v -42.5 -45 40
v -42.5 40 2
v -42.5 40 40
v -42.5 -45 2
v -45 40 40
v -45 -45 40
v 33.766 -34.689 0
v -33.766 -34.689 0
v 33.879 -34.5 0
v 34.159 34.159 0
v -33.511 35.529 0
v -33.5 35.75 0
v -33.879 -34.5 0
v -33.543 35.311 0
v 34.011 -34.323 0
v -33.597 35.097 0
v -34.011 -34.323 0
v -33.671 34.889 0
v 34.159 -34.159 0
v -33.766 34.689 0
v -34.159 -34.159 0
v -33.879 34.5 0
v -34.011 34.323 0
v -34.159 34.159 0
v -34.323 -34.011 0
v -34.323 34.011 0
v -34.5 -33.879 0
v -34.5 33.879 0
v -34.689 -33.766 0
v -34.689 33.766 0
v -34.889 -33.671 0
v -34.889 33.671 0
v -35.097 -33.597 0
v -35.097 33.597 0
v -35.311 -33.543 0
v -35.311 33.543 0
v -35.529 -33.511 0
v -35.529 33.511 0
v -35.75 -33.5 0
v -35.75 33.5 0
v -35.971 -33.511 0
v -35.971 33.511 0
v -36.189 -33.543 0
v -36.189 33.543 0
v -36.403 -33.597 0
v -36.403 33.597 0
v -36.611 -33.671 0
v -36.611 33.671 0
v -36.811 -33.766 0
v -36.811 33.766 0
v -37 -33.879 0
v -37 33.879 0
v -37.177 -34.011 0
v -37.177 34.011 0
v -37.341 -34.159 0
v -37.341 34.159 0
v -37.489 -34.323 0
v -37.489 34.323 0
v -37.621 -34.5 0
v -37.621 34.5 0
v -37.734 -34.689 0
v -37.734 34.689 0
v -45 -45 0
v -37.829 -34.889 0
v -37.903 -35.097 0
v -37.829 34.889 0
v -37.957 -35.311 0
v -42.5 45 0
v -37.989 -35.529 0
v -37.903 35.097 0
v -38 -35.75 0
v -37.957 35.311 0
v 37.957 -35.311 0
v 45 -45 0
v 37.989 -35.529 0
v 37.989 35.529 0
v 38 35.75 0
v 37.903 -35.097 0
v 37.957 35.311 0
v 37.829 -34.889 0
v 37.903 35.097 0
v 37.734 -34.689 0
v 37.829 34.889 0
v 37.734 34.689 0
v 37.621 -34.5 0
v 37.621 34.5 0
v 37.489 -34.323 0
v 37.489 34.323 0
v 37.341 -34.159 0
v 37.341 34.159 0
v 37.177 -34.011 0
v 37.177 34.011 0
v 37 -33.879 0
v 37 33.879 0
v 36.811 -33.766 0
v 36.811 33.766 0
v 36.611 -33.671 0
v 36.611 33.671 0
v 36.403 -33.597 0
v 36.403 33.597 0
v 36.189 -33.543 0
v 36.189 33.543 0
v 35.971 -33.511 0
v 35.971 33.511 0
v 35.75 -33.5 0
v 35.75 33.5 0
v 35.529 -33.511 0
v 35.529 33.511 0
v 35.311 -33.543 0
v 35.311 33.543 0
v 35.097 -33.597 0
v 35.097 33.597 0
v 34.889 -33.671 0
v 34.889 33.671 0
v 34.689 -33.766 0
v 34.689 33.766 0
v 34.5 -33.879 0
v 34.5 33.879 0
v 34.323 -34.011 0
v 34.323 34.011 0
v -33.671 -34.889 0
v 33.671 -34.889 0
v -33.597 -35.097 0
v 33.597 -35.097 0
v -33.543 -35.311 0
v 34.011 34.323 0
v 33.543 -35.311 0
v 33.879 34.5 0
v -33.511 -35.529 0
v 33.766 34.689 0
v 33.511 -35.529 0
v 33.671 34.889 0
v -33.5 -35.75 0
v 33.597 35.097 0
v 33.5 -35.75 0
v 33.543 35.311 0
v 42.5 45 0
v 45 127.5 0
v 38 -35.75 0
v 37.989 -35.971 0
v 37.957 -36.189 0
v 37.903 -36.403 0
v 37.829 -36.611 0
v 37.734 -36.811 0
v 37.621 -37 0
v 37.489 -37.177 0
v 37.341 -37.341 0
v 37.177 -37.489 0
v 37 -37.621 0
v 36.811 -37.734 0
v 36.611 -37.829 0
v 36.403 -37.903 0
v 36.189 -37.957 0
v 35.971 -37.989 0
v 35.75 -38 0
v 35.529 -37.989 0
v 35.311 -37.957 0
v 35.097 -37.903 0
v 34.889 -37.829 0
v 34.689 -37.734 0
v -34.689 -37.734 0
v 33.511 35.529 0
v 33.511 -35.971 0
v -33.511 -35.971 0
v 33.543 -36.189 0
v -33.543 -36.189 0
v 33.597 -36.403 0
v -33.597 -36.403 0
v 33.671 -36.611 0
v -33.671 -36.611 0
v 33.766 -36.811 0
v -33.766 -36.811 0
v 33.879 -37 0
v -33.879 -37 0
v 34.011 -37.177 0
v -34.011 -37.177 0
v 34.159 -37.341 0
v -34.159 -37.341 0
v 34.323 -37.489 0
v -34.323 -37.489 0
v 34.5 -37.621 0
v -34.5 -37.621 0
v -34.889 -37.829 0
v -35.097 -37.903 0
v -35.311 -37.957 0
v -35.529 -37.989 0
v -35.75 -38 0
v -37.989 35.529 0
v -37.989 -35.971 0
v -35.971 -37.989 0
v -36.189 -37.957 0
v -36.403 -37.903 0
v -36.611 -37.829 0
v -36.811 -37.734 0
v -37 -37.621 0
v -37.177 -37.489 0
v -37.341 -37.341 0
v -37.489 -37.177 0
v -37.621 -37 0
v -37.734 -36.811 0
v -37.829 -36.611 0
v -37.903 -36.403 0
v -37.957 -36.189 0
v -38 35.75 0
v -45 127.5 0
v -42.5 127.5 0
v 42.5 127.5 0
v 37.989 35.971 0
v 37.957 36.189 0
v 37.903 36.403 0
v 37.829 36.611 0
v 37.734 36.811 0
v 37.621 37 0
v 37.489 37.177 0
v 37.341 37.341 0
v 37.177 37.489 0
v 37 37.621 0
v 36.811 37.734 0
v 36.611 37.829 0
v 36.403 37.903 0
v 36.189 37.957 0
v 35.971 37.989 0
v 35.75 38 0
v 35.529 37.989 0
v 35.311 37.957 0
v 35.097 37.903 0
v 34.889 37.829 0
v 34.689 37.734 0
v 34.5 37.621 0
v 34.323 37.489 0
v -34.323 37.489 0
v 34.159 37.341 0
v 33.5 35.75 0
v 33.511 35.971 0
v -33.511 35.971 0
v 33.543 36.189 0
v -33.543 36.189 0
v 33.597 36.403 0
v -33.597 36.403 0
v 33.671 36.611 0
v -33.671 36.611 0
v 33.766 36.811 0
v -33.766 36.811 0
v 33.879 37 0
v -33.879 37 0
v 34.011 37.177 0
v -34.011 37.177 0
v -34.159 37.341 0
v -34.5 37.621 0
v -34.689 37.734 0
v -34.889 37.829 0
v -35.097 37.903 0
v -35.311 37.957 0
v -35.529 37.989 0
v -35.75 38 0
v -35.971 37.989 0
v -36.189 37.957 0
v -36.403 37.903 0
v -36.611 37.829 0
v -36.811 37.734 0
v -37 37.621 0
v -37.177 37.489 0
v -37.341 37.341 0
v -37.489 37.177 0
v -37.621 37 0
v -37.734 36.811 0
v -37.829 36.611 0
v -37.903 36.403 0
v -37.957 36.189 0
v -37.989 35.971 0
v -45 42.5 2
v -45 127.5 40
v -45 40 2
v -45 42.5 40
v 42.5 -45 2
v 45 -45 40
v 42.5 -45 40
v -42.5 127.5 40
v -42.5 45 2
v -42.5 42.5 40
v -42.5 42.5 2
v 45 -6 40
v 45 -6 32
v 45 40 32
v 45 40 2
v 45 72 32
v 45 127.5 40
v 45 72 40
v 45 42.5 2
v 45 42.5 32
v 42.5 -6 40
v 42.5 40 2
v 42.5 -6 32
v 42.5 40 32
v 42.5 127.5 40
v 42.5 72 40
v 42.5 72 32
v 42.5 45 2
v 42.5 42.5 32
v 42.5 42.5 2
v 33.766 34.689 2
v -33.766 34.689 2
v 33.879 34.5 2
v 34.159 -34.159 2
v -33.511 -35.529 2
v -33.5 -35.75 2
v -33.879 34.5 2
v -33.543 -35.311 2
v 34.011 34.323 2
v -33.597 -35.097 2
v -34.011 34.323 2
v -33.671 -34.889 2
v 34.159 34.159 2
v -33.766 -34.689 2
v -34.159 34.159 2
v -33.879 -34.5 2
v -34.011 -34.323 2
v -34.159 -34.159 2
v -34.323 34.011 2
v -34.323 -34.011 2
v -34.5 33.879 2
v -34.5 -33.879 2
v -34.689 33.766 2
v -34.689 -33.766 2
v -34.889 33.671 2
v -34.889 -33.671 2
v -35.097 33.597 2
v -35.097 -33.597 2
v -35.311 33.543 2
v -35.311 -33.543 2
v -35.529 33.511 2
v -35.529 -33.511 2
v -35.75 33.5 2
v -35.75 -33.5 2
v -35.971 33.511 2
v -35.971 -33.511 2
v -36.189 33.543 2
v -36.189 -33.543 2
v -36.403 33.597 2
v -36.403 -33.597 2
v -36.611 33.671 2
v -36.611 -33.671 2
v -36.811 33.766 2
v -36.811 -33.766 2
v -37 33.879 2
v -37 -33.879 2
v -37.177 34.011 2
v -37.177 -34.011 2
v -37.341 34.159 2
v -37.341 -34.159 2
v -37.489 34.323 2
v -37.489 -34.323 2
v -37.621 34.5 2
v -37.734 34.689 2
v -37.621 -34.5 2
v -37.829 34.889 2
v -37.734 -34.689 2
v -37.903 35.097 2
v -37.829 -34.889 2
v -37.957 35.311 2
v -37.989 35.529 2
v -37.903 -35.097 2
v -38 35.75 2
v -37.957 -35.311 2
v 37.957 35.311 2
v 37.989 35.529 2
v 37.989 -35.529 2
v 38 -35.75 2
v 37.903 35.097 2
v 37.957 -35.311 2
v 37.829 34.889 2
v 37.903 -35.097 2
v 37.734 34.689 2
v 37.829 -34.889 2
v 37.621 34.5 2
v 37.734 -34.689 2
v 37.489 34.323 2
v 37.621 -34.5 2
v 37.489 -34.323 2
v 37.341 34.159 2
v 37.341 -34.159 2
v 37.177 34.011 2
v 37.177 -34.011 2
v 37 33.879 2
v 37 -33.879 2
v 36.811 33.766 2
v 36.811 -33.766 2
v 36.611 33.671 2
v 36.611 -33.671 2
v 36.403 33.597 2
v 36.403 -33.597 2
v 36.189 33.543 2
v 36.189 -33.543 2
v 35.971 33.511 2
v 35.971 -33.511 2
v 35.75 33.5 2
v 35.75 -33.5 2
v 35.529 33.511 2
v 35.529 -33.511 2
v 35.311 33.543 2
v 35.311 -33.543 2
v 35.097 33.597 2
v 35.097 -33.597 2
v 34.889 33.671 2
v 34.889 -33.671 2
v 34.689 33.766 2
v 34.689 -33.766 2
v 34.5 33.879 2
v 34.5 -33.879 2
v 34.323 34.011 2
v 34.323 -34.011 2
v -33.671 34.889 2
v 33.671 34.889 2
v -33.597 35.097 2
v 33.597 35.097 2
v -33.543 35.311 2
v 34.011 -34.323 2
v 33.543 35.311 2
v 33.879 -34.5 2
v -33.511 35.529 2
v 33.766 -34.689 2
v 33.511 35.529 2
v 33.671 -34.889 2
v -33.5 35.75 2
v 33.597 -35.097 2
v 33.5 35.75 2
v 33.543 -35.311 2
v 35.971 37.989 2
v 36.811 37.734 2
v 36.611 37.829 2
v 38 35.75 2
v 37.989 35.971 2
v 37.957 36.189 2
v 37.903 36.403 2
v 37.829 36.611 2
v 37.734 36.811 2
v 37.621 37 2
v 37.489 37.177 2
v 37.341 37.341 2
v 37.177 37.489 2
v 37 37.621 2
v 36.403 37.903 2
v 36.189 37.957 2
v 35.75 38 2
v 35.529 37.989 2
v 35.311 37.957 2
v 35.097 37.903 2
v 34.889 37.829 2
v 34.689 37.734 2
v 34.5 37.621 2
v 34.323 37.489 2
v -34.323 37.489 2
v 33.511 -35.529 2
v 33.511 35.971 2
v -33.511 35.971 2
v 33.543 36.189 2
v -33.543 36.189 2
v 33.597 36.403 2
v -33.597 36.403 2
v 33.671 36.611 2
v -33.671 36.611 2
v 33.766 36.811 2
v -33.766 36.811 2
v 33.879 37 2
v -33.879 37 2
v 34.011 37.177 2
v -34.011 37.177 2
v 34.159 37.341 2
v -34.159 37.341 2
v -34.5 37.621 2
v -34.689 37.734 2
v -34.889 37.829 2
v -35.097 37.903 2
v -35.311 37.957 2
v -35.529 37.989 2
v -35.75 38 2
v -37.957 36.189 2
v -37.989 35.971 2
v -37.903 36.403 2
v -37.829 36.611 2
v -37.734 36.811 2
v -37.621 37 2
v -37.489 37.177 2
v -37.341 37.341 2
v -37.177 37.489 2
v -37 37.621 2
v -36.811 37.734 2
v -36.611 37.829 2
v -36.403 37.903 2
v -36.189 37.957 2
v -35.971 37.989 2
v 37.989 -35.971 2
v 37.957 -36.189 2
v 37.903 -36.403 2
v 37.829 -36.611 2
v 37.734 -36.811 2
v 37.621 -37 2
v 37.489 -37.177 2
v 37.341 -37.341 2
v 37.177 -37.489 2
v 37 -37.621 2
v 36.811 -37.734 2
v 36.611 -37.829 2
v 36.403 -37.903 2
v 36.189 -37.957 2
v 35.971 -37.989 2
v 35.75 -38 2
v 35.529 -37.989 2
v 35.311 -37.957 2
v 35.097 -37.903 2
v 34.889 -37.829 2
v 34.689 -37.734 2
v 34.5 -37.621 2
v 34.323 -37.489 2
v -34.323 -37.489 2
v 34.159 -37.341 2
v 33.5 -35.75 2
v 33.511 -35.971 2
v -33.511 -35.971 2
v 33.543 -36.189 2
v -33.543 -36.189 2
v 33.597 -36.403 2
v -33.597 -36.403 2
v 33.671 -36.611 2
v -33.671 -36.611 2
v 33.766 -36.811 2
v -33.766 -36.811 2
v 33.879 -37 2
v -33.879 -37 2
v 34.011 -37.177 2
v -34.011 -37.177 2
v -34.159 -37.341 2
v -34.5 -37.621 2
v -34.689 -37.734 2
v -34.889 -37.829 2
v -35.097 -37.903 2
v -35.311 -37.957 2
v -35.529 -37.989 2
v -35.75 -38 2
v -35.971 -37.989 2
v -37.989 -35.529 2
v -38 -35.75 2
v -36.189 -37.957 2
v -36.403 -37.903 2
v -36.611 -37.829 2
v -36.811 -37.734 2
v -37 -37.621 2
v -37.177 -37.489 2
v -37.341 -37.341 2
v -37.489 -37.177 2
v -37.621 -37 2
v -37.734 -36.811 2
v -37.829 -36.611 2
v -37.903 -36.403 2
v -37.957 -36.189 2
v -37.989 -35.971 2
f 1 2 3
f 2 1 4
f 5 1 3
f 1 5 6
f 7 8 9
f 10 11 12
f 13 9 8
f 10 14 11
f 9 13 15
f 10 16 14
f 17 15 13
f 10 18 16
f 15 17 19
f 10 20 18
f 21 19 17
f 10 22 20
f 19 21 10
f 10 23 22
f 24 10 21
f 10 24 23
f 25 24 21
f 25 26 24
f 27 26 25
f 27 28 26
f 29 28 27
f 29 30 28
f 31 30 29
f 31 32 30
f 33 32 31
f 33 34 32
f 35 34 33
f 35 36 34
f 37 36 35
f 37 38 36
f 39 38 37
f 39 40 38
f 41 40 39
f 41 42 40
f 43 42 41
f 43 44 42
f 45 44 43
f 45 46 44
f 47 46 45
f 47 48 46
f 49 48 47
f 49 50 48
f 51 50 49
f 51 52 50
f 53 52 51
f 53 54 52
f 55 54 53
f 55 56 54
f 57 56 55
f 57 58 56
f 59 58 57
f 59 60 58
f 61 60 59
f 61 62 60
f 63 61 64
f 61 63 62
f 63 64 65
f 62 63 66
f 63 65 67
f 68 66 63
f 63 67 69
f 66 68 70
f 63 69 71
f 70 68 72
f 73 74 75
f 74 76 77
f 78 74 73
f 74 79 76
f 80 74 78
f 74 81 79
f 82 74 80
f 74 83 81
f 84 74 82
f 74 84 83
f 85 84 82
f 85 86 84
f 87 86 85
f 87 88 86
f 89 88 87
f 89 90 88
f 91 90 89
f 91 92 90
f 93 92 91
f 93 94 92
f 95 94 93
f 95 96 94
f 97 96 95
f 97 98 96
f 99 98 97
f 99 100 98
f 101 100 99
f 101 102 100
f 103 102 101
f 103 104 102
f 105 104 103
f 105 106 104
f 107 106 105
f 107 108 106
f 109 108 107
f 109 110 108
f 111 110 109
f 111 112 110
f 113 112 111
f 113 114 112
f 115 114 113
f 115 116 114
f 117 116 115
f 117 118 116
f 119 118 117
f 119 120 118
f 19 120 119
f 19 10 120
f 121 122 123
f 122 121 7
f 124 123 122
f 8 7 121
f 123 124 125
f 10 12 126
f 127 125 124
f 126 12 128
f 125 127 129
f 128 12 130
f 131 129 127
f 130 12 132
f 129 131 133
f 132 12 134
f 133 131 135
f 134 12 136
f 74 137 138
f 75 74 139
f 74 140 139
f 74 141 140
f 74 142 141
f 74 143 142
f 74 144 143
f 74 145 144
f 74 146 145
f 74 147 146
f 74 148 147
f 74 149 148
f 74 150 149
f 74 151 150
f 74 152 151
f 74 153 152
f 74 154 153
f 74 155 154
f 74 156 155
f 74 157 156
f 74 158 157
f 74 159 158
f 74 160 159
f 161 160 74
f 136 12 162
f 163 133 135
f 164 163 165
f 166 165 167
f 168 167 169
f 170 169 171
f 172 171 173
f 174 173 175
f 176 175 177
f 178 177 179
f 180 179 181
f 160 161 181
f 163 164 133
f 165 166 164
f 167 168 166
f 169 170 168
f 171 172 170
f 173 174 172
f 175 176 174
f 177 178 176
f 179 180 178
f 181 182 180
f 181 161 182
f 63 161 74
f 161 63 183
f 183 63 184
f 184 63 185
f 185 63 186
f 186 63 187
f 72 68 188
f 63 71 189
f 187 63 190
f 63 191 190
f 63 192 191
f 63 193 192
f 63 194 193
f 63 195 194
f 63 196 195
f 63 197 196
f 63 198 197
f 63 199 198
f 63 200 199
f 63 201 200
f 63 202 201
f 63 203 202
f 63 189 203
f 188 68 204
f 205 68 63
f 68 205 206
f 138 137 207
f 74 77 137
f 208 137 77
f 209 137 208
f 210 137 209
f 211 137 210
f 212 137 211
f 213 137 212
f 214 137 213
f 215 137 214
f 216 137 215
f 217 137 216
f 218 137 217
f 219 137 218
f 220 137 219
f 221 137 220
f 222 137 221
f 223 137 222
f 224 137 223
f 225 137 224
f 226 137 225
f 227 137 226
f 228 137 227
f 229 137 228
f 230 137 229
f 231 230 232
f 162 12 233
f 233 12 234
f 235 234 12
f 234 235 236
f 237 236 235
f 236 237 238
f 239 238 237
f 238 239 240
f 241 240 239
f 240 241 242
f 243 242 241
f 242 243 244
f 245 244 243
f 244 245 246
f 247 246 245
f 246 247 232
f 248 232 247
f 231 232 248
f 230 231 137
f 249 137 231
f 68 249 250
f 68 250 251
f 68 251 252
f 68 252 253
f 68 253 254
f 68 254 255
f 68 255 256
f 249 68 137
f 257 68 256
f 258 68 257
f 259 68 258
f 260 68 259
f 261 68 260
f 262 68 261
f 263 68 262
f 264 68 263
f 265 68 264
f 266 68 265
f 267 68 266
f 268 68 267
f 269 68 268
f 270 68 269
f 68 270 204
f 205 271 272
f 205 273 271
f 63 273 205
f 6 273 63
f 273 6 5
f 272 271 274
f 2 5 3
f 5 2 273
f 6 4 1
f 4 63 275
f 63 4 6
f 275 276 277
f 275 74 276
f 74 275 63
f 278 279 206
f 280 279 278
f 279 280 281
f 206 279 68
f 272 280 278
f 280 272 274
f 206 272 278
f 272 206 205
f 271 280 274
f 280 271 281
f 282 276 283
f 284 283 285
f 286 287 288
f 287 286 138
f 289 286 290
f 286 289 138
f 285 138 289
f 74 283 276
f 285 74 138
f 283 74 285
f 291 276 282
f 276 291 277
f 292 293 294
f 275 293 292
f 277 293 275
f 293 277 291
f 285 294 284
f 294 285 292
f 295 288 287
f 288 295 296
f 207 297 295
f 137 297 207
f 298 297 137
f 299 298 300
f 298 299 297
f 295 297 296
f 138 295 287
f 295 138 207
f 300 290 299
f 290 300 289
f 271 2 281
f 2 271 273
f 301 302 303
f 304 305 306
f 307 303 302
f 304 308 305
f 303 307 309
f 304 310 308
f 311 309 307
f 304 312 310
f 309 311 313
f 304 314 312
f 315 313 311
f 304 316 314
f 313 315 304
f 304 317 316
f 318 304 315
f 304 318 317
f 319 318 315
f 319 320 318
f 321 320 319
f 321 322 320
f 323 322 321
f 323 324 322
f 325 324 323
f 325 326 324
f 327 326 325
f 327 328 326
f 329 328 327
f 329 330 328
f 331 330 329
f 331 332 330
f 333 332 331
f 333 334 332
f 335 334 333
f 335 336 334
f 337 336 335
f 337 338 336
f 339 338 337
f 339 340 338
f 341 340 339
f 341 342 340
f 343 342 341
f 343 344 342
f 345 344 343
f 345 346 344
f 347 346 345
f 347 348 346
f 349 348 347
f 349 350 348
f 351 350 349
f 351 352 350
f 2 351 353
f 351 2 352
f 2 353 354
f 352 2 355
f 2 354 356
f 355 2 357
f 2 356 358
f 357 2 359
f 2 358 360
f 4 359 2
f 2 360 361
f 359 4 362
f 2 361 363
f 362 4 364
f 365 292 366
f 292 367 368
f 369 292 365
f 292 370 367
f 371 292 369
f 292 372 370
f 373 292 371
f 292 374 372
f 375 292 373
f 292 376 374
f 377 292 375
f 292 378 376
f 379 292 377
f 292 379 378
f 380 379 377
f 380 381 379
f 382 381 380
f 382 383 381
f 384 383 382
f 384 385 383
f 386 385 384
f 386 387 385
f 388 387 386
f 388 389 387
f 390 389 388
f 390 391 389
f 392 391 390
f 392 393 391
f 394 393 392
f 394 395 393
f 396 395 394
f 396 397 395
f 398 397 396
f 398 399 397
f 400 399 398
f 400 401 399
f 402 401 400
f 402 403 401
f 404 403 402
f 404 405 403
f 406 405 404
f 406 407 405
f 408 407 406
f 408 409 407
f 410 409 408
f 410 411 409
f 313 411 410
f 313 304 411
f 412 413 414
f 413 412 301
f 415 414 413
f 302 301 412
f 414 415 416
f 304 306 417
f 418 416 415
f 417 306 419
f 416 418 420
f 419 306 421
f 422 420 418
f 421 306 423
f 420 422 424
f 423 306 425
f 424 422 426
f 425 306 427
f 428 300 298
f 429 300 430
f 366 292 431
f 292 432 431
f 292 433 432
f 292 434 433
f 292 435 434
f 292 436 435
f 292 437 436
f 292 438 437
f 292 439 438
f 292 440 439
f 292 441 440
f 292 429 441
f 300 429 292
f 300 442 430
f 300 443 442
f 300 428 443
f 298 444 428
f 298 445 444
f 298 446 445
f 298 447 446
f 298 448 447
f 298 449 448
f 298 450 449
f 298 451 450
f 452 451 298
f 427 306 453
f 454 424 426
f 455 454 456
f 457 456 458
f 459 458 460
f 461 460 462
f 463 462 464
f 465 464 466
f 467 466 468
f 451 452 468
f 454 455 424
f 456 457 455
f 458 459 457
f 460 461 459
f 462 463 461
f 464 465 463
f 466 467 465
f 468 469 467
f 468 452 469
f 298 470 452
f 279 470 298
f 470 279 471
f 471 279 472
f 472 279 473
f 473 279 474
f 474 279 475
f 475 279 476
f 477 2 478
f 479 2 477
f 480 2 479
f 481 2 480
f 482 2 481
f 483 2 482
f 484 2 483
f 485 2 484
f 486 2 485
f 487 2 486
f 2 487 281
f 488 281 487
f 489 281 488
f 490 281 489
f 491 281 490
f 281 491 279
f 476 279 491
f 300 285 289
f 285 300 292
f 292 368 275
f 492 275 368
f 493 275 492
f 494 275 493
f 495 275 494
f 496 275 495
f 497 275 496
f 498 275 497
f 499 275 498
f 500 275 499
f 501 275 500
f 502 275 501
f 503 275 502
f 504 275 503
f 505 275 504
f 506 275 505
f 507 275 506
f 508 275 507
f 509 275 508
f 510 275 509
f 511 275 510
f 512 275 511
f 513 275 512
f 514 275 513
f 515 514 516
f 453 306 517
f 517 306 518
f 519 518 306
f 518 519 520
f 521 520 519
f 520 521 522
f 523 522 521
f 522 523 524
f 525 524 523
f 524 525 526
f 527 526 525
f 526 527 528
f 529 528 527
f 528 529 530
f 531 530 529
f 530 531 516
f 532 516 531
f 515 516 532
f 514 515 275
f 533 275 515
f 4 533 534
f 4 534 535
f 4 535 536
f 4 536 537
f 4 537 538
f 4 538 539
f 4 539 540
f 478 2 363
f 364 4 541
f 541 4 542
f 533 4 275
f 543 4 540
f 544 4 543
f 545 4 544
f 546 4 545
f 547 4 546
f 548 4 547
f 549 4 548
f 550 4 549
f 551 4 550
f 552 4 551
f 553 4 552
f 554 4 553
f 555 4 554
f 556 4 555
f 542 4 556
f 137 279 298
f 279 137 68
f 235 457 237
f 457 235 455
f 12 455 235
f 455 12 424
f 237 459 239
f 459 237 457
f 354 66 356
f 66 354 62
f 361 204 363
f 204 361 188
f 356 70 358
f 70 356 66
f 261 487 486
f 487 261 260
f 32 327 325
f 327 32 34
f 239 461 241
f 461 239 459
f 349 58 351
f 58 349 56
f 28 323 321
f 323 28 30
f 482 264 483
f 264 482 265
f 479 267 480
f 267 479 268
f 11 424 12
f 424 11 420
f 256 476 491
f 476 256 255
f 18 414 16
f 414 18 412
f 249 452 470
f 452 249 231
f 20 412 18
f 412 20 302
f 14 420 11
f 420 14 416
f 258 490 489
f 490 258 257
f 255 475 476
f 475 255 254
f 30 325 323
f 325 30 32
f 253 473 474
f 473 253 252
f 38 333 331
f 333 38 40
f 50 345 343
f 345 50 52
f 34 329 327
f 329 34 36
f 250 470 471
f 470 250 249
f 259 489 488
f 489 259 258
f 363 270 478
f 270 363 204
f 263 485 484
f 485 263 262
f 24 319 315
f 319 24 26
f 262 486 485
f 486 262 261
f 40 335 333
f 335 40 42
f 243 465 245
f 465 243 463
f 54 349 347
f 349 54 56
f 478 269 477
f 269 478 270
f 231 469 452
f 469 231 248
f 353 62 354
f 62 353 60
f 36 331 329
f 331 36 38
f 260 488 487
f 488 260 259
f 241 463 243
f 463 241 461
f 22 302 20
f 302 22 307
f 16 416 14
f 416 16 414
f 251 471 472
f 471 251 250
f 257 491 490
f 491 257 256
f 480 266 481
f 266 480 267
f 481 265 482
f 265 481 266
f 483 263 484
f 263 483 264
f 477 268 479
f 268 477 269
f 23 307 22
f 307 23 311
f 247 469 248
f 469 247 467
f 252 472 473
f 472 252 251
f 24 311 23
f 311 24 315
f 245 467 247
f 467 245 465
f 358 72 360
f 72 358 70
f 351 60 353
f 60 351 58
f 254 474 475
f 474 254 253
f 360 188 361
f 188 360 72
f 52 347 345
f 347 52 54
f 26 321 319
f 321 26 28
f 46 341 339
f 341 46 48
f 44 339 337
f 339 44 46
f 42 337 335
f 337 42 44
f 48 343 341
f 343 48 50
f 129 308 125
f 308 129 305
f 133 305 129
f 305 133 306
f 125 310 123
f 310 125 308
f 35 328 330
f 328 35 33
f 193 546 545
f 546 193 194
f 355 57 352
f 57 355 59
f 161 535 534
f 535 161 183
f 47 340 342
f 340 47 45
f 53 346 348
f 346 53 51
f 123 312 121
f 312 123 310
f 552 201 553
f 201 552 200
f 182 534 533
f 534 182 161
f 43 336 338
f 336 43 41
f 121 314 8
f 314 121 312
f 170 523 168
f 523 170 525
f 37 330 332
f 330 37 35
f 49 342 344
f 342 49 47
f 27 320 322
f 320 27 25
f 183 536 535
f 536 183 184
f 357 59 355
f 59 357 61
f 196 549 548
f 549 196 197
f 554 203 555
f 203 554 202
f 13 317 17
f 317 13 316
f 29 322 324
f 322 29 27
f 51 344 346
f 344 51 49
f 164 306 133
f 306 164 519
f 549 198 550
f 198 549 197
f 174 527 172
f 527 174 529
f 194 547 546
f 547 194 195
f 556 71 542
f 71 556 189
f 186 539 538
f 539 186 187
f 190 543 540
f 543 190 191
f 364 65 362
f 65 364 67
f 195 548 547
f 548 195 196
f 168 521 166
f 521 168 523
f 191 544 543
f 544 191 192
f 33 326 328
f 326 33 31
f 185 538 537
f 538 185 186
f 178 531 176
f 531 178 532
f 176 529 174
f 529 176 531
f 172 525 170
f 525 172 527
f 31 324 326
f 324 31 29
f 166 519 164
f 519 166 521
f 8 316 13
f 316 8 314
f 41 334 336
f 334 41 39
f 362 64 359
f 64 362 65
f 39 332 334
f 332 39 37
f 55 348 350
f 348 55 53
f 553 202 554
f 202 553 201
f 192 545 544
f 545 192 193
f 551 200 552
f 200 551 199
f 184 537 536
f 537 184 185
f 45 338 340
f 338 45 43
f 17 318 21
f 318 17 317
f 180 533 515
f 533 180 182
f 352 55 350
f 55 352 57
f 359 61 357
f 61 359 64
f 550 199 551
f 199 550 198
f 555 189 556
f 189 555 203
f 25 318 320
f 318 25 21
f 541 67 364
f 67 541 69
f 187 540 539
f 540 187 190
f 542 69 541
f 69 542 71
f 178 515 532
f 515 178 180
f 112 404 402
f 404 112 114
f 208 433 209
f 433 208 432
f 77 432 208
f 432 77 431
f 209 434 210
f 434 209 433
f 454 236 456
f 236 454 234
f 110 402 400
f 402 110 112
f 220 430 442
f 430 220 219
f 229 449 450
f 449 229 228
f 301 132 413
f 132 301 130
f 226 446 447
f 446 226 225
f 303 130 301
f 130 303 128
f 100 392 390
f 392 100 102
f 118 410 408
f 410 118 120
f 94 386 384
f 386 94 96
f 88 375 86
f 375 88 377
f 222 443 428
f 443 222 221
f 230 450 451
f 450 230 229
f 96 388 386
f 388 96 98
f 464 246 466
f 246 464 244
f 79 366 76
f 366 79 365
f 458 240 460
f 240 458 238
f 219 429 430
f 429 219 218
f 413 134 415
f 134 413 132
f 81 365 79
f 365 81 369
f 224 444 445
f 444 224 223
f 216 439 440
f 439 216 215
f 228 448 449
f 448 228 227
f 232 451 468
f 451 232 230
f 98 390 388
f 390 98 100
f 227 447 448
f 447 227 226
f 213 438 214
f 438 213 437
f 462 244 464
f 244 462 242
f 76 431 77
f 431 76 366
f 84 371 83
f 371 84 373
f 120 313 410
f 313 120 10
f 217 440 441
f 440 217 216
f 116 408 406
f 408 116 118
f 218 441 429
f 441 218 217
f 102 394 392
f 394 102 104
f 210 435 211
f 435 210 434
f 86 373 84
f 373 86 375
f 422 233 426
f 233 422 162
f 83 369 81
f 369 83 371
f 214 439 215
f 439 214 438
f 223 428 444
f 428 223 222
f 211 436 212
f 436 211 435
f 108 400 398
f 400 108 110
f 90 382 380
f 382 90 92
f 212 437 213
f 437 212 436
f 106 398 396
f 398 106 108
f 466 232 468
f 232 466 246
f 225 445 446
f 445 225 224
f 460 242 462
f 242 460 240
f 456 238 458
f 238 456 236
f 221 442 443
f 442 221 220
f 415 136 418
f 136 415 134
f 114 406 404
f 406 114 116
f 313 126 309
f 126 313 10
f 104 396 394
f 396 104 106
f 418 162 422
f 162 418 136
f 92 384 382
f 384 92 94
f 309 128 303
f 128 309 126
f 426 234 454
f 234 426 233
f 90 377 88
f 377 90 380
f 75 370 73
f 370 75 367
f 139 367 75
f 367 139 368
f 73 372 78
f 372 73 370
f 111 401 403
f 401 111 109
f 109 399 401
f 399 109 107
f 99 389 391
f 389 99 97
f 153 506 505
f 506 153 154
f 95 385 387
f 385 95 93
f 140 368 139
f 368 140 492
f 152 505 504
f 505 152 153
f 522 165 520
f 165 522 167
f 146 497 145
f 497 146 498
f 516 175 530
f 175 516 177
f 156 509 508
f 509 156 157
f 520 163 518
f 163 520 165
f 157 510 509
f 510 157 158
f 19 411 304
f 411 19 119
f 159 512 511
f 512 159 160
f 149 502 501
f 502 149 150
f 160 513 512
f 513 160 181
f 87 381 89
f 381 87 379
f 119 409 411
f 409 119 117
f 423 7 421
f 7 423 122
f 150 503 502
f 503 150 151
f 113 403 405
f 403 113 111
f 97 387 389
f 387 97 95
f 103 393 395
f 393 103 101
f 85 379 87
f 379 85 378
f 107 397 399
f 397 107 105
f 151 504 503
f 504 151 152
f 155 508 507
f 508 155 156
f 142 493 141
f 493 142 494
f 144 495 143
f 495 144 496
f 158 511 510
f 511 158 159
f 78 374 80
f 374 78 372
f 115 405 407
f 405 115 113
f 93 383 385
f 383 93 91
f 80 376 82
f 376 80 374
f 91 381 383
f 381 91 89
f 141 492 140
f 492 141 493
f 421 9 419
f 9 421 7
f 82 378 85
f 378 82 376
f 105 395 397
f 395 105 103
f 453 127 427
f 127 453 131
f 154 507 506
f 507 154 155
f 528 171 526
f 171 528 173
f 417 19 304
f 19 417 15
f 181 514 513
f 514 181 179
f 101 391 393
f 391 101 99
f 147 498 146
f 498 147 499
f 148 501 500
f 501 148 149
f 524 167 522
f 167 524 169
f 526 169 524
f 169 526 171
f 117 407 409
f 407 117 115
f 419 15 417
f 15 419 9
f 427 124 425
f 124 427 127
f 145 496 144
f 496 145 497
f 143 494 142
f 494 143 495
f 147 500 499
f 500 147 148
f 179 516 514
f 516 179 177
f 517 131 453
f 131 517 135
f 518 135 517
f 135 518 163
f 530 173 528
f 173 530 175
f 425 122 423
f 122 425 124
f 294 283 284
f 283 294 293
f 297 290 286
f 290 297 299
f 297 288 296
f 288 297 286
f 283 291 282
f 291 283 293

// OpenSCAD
// Magnetic stirrer housing - upside-down open box over a 80 mm PC fan
// Print orientation: top plate on bed (z = 0..2), walls rise to z = 40

// ---------- Parameters ----------
box_outer_x      = 90;    // outer size in X (mm)
box_outer_y      = 90;    // outer size in Y (mm)
top_plate_t      = 2;     // top plate thickness (mm)
wall_t           = 2.5;   // wall thickness (mm)
wall_top_z       = 40;    // height of open top (mm)
screw_hole_d     = 4.5;   // M4 screw hole diameter (mm)
screw_pattern_a  = 71.5;  // square pitch of screw holes (mm)
notch_w          = 12;    // cable notch width (mm)
notch_bottom_z   = 32;    // notch bottom height (mm)
eps              = 0.5;   // cutter overshoot past faces (mm)
$fn              = 64;    // curve resolution

// ---------- Model ----------
difference() {
    // Solid body: top plate + four walls, open top
    union() {
        // Top plate
        translate([-box_outer_x/2, -box_outer_y/2, 0])
            cube([box_outer_x, box_outer_y, top_plate_t]);
        // Walls (open top)
        for (sx = [-1, 1], sy = [-1, 1])
            translate([sx > 0 ? box_outer_x/2 - wall_t : -box_outer_x/2,
                       sy > 0 ? box_outer_y/2 - wall_t : -box_outer_y/2,
                       0])
                cube([wall_t, box_outer_y - 2*wall_t, wall_top_z]);
    }

    // Screw holes through top plate, centred on plate
    for (i = [0, 1, 2, 3])
        translate([(i < 2 ? -1 : 1) * screw_pattern_a/2,
                   (i % 2 ? -1 : 1) * screw_pattern_a/2,
                   -eps])
            cylinder(d = screw_hole_d, h = top_plate_t + 2*eps);

    // Cable notch in one wall, centred along the wall
    translate([box_outer_x/2 - notch_w/2, -notch_w/2, notch_bottom_z])
        cube([notch_w, box_outer_y - notch_w, wall_top_z - notch_bottom_z + eps]);
}
